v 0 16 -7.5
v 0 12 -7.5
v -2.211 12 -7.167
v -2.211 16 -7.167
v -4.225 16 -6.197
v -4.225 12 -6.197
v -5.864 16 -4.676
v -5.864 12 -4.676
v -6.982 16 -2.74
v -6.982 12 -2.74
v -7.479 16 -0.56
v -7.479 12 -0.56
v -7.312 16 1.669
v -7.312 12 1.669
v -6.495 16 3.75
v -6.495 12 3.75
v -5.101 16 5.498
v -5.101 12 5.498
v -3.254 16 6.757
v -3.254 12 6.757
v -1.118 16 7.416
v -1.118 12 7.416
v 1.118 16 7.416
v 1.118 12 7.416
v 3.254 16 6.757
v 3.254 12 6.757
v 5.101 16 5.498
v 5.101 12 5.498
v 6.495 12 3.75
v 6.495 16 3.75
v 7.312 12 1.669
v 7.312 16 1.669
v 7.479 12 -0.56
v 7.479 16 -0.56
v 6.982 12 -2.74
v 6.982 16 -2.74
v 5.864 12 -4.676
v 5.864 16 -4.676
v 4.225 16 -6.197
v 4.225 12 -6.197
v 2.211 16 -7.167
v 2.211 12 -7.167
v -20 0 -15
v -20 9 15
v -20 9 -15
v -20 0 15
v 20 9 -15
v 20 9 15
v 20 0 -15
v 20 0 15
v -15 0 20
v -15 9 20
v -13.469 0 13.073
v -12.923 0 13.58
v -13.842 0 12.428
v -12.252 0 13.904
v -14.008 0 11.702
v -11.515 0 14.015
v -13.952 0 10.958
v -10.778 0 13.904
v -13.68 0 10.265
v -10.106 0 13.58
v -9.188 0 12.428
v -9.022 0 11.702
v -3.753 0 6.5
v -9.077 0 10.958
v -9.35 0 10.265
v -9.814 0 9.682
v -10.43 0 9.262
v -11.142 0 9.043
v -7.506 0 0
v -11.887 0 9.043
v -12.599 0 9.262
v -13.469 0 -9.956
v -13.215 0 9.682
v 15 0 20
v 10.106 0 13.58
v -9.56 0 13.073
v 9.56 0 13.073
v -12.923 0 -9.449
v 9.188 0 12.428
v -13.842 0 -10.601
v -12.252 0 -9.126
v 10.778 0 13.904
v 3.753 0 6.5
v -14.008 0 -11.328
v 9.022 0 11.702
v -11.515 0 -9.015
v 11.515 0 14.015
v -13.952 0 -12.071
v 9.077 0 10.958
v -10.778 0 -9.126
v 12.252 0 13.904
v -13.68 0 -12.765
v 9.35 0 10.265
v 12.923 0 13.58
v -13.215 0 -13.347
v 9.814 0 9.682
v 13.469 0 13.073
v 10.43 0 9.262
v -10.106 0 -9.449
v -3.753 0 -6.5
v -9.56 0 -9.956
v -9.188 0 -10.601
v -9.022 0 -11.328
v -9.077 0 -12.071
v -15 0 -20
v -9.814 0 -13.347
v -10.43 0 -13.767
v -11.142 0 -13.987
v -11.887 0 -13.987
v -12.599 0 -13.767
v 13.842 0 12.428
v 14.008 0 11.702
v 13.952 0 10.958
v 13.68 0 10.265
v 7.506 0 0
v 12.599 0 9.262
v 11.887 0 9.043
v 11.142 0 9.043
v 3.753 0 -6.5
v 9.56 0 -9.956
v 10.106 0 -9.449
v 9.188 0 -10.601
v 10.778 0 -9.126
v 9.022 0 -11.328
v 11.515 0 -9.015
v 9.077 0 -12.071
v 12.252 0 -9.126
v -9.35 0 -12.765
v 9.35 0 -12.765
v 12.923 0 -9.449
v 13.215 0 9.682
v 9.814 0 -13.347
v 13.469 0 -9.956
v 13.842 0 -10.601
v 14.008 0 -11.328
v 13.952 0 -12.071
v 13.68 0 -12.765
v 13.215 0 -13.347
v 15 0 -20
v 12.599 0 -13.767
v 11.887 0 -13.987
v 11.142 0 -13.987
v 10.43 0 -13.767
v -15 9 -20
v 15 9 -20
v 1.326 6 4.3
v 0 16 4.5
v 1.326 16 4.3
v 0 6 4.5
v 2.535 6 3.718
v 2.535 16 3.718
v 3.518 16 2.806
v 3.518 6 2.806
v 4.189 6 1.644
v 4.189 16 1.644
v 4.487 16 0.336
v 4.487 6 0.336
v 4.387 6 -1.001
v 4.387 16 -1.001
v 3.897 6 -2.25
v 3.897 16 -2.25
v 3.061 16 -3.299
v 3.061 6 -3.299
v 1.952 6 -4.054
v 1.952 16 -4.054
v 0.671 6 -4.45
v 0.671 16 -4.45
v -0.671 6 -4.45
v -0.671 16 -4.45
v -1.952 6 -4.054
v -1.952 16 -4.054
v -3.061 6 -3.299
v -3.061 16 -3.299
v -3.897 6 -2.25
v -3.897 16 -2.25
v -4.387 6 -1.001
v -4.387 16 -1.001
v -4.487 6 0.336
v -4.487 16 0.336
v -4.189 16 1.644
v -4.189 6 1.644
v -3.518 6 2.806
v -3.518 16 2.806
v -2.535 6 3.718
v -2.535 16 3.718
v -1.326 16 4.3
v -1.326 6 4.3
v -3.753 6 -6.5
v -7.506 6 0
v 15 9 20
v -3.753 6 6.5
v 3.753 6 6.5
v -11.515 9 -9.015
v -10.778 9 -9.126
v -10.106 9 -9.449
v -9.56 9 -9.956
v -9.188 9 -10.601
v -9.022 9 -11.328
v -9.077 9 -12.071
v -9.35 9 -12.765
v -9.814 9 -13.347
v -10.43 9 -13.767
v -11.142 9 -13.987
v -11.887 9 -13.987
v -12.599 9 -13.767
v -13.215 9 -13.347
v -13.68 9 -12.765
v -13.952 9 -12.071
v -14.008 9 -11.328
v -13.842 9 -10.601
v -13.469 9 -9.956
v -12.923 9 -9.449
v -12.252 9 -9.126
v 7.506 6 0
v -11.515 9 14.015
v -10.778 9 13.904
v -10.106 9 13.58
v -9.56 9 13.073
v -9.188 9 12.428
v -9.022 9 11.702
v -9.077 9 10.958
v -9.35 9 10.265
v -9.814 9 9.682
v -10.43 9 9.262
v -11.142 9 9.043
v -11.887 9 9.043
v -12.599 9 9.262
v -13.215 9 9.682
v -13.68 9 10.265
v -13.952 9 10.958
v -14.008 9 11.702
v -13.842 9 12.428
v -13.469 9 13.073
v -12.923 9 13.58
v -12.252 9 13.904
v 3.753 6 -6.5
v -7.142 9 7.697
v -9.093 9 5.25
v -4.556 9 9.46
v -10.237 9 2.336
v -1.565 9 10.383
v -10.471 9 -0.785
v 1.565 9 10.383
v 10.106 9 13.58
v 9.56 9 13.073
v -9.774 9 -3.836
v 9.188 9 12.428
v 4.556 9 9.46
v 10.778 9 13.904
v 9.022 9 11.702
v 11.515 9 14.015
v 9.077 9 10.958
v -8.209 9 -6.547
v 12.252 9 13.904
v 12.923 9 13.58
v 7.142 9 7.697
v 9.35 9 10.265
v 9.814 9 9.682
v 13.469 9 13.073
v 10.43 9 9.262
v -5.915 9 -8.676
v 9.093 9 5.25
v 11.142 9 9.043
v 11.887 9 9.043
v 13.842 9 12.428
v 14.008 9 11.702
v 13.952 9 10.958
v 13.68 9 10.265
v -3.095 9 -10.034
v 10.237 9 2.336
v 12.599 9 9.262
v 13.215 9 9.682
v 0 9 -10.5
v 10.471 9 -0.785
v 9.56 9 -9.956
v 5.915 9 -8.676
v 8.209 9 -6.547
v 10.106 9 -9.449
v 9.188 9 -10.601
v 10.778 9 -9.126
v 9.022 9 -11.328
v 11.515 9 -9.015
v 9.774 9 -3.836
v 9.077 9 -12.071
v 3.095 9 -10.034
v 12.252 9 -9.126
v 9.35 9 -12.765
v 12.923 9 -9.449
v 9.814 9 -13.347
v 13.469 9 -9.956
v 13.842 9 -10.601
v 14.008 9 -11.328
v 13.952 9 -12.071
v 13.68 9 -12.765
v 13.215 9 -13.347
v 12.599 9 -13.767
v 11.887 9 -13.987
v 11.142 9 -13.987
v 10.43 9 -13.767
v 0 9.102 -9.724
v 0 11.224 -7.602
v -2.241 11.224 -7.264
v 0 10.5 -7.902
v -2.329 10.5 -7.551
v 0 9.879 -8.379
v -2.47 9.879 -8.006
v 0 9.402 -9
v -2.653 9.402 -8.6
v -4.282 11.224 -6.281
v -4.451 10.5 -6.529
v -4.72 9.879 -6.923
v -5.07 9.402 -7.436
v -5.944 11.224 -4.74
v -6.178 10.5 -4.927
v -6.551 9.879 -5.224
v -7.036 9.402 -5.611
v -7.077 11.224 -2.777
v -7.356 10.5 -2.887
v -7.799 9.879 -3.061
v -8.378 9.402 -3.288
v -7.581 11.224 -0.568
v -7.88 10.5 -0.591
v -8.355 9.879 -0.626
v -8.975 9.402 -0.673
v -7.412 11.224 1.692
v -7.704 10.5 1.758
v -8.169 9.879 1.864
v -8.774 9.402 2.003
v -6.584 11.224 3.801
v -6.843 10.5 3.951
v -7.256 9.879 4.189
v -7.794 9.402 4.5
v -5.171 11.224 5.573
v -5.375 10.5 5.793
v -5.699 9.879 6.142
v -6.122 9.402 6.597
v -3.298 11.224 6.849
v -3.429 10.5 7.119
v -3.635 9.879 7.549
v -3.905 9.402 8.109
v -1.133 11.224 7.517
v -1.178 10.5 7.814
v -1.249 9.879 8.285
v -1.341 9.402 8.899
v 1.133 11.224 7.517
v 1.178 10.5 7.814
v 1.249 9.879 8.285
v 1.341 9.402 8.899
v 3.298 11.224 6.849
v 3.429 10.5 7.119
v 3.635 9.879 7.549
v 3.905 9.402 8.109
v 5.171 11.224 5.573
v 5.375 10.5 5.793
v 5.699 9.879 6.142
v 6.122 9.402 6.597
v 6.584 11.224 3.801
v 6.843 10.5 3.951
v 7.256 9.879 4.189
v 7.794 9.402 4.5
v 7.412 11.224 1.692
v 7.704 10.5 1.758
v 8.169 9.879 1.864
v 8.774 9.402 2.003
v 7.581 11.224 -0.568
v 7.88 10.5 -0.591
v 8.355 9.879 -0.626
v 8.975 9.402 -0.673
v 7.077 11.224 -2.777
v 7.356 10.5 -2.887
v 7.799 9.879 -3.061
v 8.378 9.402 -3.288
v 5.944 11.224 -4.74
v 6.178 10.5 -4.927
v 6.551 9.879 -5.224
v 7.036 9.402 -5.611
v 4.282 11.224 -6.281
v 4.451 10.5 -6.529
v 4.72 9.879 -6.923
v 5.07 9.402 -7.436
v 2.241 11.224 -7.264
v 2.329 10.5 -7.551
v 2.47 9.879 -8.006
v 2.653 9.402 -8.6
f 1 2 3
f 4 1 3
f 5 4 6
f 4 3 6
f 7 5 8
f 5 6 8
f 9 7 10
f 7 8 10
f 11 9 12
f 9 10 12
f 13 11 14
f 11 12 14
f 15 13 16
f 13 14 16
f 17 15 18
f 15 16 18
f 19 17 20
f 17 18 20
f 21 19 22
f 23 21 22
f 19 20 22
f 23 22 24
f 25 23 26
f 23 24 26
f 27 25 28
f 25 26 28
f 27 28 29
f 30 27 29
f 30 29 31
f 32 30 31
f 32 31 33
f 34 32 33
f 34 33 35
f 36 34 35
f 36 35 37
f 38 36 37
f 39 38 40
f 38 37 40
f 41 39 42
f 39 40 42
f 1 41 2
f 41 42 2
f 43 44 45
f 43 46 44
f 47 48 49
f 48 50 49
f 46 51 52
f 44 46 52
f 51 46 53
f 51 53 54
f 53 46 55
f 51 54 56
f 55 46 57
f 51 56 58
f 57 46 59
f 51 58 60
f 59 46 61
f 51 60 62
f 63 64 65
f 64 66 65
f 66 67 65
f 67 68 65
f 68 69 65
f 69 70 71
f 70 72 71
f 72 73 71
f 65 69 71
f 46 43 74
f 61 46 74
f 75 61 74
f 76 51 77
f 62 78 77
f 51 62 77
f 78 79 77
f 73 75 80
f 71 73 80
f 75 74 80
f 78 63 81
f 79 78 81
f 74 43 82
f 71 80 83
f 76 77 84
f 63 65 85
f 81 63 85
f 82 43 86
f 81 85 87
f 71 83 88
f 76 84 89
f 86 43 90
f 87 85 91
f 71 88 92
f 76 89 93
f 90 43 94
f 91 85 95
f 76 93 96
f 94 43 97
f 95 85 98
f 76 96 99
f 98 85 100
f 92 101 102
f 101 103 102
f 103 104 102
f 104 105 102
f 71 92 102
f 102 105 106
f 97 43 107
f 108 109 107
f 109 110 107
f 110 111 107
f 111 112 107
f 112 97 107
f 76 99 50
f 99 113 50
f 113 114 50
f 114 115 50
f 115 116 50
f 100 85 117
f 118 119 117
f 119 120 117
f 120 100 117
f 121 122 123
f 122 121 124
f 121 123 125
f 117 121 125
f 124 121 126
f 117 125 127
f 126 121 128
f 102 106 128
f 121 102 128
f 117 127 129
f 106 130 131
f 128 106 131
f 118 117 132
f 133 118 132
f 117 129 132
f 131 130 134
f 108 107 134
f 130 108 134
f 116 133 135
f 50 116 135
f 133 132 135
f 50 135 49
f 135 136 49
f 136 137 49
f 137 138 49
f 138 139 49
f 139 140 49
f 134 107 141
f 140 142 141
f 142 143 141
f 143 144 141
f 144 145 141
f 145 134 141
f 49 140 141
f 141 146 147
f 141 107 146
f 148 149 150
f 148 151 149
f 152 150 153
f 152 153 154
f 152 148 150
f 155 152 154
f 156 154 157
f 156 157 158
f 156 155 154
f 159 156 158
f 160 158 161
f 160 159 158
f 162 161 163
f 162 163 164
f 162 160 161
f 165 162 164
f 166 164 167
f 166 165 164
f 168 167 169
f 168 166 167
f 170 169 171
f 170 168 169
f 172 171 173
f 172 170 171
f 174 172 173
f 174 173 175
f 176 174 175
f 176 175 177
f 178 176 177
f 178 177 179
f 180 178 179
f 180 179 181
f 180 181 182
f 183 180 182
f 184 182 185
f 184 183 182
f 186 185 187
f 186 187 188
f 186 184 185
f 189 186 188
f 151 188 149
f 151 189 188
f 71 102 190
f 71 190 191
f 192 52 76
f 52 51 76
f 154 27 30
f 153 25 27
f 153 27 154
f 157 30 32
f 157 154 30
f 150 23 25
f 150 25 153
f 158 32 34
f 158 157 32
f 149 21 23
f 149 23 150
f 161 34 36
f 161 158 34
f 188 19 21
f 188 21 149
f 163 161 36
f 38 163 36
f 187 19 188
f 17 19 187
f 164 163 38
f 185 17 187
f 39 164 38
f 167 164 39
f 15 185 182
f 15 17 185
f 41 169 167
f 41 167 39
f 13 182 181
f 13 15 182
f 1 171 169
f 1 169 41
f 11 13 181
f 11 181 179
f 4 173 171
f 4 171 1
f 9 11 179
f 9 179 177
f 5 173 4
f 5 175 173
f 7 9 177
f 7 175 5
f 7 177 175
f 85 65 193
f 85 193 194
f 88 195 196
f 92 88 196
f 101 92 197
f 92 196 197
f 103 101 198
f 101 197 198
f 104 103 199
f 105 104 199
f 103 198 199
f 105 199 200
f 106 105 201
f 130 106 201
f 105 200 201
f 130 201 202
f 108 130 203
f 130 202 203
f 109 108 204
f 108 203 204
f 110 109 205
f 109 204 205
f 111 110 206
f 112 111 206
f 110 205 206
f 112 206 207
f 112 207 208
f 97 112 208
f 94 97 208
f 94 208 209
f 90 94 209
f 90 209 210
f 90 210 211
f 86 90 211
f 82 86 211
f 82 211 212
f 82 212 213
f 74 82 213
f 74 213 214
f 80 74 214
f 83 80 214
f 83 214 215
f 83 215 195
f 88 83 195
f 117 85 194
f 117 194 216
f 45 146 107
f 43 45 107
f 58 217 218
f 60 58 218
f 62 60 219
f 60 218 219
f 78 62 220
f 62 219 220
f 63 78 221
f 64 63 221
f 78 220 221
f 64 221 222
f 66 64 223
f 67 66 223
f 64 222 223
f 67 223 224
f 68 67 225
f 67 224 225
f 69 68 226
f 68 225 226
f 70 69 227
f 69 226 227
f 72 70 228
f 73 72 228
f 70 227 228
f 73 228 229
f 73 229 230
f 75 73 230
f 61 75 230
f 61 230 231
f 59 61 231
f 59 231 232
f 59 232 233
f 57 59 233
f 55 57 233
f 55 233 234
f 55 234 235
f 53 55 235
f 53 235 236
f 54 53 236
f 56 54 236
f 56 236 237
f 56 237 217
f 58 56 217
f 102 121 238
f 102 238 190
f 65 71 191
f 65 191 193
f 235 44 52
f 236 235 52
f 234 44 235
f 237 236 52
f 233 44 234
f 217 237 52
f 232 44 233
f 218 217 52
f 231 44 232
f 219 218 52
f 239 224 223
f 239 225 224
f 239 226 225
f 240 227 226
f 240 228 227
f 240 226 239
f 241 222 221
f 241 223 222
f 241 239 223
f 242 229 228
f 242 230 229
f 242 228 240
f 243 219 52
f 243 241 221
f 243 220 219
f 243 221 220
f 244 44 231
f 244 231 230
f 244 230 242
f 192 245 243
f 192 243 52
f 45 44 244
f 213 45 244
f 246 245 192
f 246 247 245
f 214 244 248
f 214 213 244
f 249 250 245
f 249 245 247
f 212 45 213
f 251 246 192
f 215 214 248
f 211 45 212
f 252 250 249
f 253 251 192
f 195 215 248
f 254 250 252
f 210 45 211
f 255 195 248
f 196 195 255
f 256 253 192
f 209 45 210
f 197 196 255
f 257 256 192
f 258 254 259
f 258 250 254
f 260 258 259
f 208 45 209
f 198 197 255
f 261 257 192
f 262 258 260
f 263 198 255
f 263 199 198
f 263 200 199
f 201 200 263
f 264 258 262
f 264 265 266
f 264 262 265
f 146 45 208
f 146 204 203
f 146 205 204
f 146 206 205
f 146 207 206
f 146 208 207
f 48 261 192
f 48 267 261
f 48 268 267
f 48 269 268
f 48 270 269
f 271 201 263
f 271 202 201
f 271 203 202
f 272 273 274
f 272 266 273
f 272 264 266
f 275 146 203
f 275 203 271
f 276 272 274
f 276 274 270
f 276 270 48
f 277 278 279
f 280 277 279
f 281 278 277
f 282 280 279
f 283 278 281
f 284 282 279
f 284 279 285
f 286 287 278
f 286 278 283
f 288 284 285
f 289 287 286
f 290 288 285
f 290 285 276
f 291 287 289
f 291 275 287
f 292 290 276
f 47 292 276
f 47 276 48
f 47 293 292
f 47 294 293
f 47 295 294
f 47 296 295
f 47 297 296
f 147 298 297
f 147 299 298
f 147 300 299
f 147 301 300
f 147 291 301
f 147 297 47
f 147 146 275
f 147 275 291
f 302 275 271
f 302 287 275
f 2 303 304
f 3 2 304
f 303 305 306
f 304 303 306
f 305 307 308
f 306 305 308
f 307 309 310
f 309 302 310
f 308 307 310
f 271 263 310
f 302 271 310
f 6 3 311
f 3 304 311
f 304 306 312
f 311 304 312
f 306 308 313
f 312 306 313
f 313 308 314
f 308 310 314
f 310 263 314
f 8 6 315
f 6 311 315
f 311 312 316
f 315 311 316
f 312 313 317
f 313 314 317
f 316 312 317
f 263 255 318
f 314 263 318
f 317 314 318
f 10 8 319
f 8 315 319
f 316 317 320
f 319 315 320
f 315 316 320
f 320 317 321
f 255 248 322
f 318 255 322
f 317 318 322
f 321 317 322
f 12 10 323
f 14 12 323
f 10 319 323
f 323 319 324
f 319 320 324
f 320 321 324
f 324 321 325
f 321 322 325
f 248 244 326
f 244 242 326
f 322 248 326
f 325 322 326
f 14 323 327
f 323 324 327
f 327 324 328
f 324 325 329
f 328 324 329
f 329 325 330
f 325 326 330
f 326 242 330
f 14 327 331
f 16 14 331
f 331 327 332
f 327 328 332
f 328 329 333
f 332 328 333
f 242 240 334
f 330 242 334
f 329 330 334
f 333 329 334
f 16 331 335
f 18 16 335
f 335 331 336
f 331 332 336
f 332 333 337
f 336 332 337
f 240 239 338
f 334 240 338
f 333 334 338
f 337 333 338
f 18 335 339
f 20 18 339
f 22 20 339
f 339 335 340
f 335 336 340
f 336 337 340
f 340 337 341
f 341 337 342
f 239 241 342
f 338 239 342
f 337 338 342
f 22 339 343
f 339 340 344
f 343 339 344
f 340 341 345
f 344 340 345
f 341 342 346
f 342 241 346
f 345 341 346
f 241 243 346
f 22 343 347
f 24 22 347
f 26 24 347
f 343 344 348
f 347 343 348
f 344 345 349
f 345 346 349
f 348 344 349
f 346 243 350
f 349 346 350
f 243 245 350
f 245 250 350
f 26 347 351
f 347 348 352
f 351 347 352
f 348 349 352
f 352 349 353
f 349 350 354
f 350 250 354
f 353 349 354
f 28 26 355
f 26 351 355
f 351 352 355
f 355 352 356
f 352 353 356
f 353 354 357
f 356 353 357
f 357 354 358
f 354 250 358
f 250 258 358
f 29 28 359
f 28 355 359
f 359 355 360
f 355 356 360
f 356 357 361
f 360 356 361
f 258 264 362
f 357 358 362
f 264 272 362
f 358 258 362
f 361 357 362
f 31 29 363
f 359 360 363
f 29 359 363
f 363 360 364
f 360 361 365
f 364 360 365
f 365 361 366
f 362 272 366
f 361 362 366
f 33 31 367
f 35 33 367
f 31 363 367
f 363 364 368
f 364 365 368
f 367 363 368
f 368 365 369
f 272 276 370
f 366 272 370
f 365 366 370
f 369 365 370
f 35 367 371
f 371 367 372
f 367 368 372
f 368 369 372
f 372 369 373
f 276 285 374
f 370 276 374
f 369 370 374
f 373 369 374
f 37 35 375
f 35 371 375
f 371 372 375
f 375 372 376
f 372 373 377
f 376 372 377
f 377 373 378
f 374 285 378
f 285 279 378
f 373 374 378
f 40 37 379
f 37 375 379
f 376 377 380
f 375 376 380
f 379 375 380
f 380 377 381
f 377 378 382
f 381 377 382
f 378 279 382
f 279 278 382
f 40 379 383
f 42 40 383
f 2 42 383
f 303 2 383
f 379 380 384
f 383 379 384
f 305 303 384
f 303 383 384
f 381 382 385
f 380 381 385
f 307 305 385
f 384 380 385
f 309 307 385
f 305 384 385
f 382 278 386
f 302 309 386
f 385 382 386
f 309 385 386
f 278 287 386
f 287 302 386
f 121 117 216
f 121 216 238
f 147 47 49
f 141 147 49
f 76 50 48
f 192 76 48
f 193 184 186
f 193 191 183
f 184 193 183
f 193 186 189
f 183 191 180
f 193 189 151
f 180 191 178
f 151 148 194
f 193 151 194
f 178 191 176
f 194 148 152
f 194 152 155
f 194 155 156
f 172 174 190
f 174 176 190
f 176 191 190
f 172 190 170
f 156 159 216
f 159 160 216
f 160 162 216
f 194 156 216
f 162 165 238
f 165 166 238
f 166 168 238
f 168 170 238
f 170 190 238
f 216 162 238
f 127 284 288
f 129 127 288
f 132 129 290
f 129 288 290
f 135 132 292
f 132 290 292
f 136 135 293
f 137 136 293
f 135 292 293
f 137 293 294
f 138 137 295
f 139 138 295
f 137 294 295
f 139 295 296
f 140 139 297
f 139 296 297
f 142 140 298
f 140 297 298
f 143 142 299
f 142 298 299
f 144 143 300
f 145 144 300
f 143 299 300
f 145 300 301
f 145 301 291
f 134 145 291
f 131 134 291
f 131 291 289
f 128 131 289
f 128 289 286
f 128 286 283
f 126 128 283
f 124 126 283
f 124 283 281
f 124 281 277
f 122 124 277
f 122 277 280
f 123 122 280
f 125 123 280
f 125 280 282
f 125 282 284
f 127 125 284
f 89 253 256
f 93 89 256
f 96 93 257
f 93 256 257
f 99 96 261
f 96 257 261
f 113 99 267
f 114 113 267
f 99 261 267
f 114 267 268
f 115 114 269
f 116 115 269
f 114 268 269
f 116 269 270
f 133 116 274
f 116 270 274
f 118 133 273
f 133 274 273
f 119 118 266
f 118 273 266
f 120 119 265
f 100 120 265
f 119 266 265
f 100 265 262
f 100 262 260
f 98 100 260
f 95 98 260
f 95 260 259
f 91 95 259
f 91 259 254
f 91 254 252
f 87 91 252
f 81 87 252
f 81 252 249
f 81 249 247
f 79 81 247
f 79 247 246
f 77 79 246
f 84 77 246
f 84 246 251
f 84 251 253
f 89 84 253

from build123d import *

# Parameters (mm, degrees)
SKETCH1_W           = 40
SKETCH1_H           = 40
BOSS_EXTRUDE1_DEPTH = 6
SKETCH2_W           = 40
SKETCH2_H           = 40
SKETCH2_R           = 4.5
BOSS_EXTRUDE2_DEPTH = 3
SKETCH3_R           = 2.5
CUT_EXTRUDE1_DEPTH  = 24
SKETCH4_R           = 7.5
SKETCH4_R_2         = 4.5
BOSS_EXTRUDE3_DEPTH = 7
FILLET1_R           = 3
CHAMFER1_SIZE       = 5


with BuildPart() as part:
    # Sketch1 → Boss-Extrude1 (new body)
    with BuildSketch(Plane(origin=(0, 0, 0), x_dir=(1, 0, 0), z_dir=(0, 1, 0))):
        Rectangle(SKETCH1_W, SKETCH1_H)
        Polygon((7.505553499, 0), (3.75277675, 6.5), (-3.75277675, 6.5), (-7.505553499, 0), (-3.75277675, -6.5), (3.75277675, -6.5), align=None, mode=Mode.SUBTRACT)
    extrude(amount=BOSS_EXTRUDE1_DEPTH)

    # Sketch2 → Boss-Extrude2 (add)
    with BuildSketch(Plane(origin=(0, 6, 0), x_dir=(1, 0, 0), z_dir=(0, 1, 0))):
        Rectangle(SKETCH2_W, SKETCH2_H)
        with Locations(Location((0, 0, 0), (0, 0, 270))):
            Circle(SKETCH2_R, mode=Mode.SUBTRACT)
    extrude(amount=BOSS_EXTRUDE2_DEPTH)

    # Sketch3 → Cut-Extrude1 (cut)
    with BuildSketch(Plane(origin=(0, 9, 0), x_dir=(1, 0, 0), z_dir=(0, 1, 0))):
        with Locations(Location((-11.514718626, 11.514718626, 0), (0, 0, 270))):
            Circle(SKETCH3_R)
        with Locations(Location((11.514718626, 11.514718626, 0), (0, 0, 270))):
            Circle(SKETCH3_R)
        with Locations(Location((11.514718626, -11.514718626, 0), (0, 0, 270))):
            Circle(SKETCH3_R)
        with Locations(Location((-11.514718626, -11.514718626, 0), (0, 0, 270))):
            Circle(SKETCH3_R)
    extrude(amount=-CUT_EXTRUDE1_DEPTH, mode=Mode.SUBTRACT)

    # Sketch4 → Boss-Extrude3 (add)
    with BuildSketch(Plane(origin=(0, 9, 0), x_dir=(1, 0, 0), z_dir=(0, 1, 0))):
        with Locations(Location((0, 0, 0), (0, 0, 90))):
            Circle(SKETCH4_R)
        with Locations(Location((0, 0, 0), (0, 0, 270))):
            Circle(SKETCH4_R_2, mode=Mode.SUBTRACT)
    extrude(amount=BOSS_EXTRUDE3_DEPTH)

    # Fillet1
    fillet1_edges = [part.edges().sort_by_distance(p)[0] for p in [
        (0, 9, 7.5),
    ]]
    fillet(fillet1_edges, radius=FILLET1_R)

    # Chamfer1
    chamfer1_edges = [part.edges().sort_by_distance(p)[0] for p in [
        (20, 4.5, 20),
        (-20, 4.5, 20),
        (-20, 4.5, -20),
        (20, 4.5, -20),
    ]]
    chamfer(chamfer1_edges, length=CHAMFER1_SIZE)


solid = part.part
